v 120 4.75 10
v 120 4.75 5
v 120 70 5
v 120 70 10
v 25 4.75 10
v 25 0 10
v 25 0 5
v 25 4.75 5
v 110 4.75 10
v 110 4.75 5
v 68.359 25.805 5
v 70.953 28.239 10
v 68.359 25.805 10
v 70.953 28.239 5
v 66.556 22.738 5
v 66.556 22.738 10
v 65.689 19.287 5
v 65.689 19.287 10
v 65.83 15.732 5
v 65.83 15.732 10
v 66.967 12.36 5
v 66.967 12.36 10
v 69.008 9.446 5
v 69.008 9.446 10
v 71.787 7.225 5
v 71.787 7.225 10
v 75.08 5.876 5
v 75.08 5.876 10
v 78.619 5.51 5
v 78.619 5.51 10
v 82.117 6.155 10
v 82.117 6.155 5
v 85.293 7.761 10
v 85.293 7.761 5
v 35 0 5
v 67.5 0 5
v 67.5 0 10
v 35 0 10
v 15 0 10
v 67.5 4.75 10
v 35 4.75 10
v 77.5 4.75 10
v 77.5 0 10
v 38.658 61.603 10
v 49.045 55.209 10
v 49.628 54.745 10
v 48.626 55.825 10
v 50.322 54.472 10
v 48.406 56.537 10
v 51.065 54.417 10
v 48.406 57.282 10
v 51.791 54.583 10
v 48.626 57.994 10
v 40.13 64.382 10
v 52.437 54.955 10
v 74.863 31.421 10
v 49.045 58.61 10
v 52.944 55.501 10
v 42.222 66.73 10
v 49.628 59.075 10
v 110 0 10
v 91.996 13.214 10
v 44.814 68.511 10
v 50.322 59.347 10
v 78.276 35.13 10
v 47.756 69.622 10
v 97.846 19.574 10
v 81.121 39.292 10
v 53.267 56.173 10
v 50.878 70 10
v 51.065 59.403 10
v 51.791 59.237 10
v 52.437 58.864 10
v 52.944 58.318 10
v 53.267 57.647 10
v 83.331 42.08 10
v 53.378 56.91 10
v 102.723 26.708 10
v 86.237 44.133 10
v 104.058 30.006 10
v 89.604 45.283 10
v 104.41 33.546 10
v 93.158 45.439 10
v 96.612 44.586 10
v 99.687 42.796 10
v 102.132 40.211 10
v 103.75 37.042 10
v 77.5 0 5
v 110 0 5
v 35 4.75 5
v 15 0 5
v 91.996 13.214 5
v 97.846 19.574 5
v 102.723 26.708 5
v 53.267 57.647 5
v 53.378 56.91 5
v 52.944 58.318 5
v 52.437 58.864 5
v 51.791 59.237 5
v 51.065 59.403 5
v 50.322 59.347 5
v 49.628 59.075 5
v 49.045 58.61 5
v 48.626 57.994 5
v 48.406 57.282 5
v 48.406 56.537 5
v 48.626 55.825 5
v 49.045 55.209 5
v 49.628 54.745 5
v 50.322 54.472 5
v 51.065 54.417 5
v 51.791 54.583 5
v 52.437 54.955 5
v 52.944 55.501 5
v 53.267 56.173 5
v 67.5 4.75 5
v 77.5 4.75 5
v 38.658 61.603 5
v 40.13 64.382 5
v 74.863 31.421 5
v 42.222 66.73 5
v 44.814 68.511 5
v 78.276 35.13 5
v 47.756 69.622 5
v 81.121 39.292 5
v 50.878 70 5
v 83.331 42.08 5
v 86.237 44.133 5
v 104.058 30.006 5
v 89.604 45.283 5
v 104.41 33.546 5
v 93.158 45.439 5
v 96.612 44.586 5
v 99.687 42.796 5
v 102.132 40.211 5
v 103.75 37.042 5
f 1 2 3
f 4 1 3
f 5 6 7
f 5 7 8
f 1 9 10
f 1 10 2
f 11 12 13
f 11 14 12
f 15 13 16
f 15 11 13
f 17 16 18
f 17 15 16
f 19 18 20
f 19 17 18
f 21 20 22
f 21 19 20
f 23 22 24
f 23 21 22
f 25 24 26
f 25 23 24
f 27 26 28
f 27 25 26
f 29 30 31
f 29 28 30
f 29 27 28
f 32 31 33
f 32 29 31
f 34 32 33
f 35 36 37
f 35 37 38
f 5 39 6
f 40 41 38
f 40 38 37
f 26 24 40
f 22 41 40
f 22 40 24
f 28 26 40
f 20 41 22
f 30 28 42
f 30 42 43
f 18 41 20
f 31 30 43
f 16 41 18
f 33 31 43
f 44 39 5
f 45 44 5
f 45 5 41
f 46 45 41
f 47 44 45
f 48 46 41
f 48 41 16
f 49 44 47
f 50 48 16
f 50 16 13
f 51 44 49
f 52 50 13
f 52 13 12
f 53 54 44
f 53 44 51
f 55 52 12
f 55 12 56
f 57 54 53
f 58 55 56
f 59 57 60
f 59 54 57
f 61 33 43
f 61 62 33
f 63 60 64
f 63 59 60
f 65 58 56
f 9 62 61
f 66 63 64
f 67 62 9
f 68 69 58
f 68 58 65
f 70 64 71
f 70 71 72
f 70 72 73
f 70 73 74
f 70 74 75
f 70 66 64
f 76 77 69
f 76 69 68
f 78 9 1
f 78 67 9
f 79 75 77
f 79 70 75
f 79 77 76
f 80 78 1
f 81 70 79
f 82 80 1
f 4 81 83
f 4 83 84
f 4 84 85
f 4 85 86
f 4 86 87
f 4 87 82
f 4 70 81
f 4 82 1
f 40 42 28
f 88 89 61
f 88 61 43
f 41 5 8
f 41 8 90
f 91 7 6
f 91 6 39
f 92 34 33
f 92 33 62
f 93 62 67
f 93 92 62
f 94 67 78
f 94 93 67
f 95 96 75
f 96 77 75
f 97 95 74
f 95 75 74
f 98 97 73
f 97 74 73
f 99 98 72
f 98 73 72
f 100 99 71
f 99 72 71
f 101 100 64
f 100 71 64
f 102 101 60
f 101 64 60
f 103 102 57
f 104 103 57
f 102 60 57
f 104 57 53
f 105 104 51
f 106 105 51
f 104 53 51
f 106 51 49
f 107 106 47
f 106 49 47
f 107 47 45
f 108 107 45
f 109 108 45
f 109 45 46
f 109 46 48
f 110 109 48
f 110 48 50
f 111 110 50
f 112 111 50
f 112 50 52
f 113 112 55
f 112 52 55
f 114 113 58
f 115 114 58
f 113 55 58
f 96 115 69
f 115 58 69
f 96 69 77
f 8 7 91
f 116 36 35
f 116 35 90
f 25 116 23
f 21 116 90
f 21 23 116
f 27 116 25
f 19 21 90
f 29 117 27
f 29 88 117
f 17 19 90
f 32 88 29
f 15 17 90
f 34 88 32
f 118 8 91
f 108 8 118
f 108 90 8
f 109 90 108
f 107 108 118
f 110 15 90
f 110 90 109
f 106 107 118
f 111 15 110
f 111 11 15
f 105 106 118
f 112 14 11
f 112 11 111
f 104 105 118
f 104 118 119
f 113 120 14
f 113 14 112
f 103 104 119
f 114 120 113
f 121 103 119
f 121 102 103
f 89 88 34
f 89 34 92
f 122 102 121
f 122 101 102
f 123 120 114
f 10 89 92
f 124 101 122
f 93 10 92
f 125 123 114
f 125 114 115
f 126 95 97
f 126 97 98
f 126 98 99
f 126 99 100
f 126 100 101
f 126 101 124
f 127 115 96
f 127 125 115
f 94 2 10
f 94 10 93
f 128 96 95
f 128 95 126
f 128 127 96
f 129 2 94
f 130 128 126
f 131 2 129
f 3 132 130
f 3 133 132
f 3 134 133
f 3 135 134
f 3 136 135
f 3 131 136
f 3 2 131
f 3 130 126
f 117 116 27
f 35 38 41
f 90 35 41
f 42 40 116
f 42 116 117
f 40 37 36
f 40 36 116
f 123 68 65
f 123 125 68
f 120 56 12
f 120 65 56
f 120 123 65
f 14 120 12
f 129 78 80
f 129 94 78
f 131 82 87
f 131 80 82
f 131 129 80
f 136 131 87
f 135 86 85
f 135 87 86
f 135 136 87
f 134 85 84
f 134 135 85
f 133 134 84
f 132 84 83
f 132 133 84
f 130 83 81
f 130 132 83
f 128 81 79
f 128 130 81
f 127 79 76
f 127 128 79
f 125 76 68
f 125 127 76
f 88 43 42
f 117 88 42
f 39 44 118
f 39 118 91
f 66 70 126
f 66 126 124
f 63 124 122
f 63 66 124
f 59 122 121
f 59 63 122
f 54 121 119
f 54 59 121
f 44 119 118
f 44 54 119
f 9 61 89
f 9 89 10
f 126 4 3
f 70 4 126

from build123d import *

# Parameters (mm, degrees)
SKETCH1_W           = 120
SKETCH1_H           = 100
BOSS_EXTRUDE1_DEPTH = 5
SKETCH2_R           = 2.5
CUT_EXTRUDE1_DEPTH  = 6
SKETCH3_W           = 120
SKETCH3_H           = 2
BOSS_EXTRUDE2_DEPTH = 20
CUT_EXTRUDE2_DEPTH  = 26
CUT_EXTRUDE3_DEPTH  = 26
SKETCH6_W           = 5
SKETCH6_H           = 30
BOSS_EXTRUDE3_DEPTH = 20
CUT_EXTRUDE4_DEPTH  = 106
SKETCH10_W          = 27.884556649
SKETCH10_H          = 70
CUT_EXTRUDE5_DEPTH  = 106
SKETCH11_W          = 20
SKETCH11_H          = 30
CUT_EXTRUDE6_DEPTH  = 106
SKETCH12_W          = 10
SKETCH12_H          = 4.75
CUT_EXTRUDE7_DEPTH  = 6


with BuildPart() as part:
    # Sketch1 → Boss-Extrude1 (new body)
    with BuildSketch(Plane.XY):
        with Locations((60, 50)):
            Rectangle(SKETCH1_W, SKETCH1_H)
    boss_extrude1 = extrude(amount=BOSS_EXTRUDE1_DEPTH)

    # Sketch2 → Cut-Extrude1 (cut, through all)
    with BuildSketch(Plane.XY.offset(5)):
        with Locations((50.878001036, 56.909722104)):
            Circle(SKETCH2_R)
        with BuildLine():
            ThreePointArc((85.292587217, 7.760599446), (95.03577446, 16.288409394), (102.722518982, 26.707967867))
            ThreePointArc((102.722518982, 26.707967867), (98.213609876, 43.800941239), (81.120636505, 39.292032133))
            ThreePointArc((81.120636505, 39.292032133), (76.6367022, 33.213956356), (70.953176308, 28.239400554))
            ThreePointArc((70.953176308, 28.239400554), (67.883481209, 10.830294546), (85.292587217, 7.760599446))
        make_face()
    cut_extrude1 = extrude(amount=-CUT_EXTRUDE1_DEPTH, mode=Mode.SUBTRACT)

    # Sketch3 → Boss-Extrude2 (add)
    with BuildSketch(Plane(origin=(0, 0, 0), x_dir=(-1, 0, 0), z_dir=(0, 0, -1))):
        with Locations((-60, 1)):
            Rectangle(SKETCH3_W, SKETCH3_H)
    boss_extrude2 = extrude(amount=BOSS_EXTRUDE2_DEPTH)

    # Sketch4 → Cut-Extrude2 (cut, through all)
    with BuildSketch(Plane.XY.offset(5)):
        with BuildLine():
            ThreePointArc((71.705399269, 35.987211382), (76.514173113, 43.433069144), (75.177144341, 52.195343835))
            ThreePointArc((75.177144341, 52.195343835), (71.771162127, 53.143650303), (70.822855659, 49.737668089))
            ThreePointArc((70.822855659, 49.737668089), (71.625072922, 44.480303275), (68.739808616, 40.012788618))
            ThreePointArc((68.739808616, 40.012788618), (68.209815325, 36.517204673), (71.705399269, 35.987211382))
        make_face()
    extrude(amount=-CUT_EXTRUDE2_DEPTH, mode=Mode.SUBTRACT)

    # Sketch5 → Cut-Extrude3 (cut, through all)
    with BuildSketch(Plane.XY.offset(5)):
        with BuildLine():
            Line((120, 70), (50.878001036, 70))
            ThreePointArc((50.878001036, 70), (43.464411706, 67.698330385), (38.657892056, 61.602728806))
            Line((38.657892056, 61.602728806), (15, 0))
            Line((15, 0), (0, 0))
            Line((0, 0), (0, 100))
            Line((0, 100), (120, 100))
            Line((120, 100), (120, 70))
        make_face()
    cut_extrude3 = extrude(amount=-CUT_EXTRUDE3_DEPTH, mode=Mode.SUBTRACT)

    # Sketch6 → Boss-Extrude3 (add, through all)
    with BuildSketch(Plane(origin=(0, 0, 0), x_dir=(-1, 0, 0), z_dir=(0, 0, -1))):
        with Locations((-117.5, 15)):
            Rectangle(SKETCH6_W, SKETCH6_H)
        with Locations((-32.5, 15)):
            Rectangle(SKETCH6_W, SKETCH6_H)
    boss_extrude3 = extrude(amount=BOSS_EXTRUDE3_DEPTH)

    # Sketch9 → Cut-Extrude4 (cut, through all)
    with BuildSketch(Plane(origin=(120, 0, 0), x_dir=(0, 0, -1), z_dir=(1, 0, 0))):
        Polygon((0, 30), (20, 0), (20, 30), align=None)
    cut_extrude4 = extrude(amount=-CUT_EXTRUDE4_DEPTH, mode=Mode.SUBTRACT)

    # Mirror1: Boss-Extrude1, Cut-Extrude1, Boss-Extrude2, Cut-Extrude3, Boss-Extrude3, Cut-Extrude4 across plane
    add(boss_extrude1.mirror(Plane(origin=(0, 0, 5), x_dir=(1, 0, 0), z_dir=(0, 0, -1))))
    add(cut_extrude1.mirror(Plane(origin=(0, 0, 5), x_dir=(1, 0, 0), z_dir=(0, 0, -1))), mode=Mode.SUBTRACT)
    add(boss_extrude2.mirror(Plane(origin=(0, 0, 5), x_dir=(1, 0, 0), z_dir=(0, 0, -1))))
    add(cut_extrude3.mirror(Plane(origin=(0, 0, 5), x_dir=(1, 0, 0), z_dir=(0, 0, -1))), mode=Mode.SUBTRACT)
    add(boss_extrude3.mirror(Plane(origin=(0, 0, 5), x_dir=(1, 0, 0), z_dir=(0, 0, -1))))
    add(cut_extrude4.mirror(Plane(origin=(0, 0, 5), x_dir=(1, 0, 0), z_dir=(0, 0, -1))), mode=Mode.SUBTRACT)

    # Sketch10 → Cut-Extrude5 (cut, through all)
    with BuildSketch(Plane(origin=(120, 0, 0), x_dir=(0, 0, -1), z_dir=(1, 0, 0))):
        with Locations((8.942278325, 35)):
            Rectangle(SKETCH10_W, SKETCH10_H)
    extrude(amount=-CUT_EXTRUDE5_DEPTH, mode=Mode.SUBTRACT)

    # Sketch11 → Cut-Extrude6 (cut, through all)
    with BuildSketch(Plane(origin=(120, 0, 0), x_dir=(0, 0, -1), z_dir=(1, 0, 0))):
        with Locations((-20, 15)):
            Rectangle(SKETCH11_W, SKETCH11_H)
    extrude(amount=-CUT_EXTRUDE6_DEPTH, mode=Mode.SUBTRACT)

    # Sketch12 → Cut-Extrude7 (cut, through all)
    with BuildSketch(Plane.XY.offset(10)):
        with Locations((115, 2.375)):
            Rectangle(SKETCH12_W, SKETCH12_H)
        with Locations((72.5, 2.375)):
            Rectangle(SKETCH12_W, SKETCH12_H)
        with Locations((30, 2.375)):
            Rectangle(SKETCH12_W, SKETCH12_H)
    extrude(amount=-CUT_EXTRUDE7_DEPTH, mode=Mode.SUBTRACT)


solid = part.part
